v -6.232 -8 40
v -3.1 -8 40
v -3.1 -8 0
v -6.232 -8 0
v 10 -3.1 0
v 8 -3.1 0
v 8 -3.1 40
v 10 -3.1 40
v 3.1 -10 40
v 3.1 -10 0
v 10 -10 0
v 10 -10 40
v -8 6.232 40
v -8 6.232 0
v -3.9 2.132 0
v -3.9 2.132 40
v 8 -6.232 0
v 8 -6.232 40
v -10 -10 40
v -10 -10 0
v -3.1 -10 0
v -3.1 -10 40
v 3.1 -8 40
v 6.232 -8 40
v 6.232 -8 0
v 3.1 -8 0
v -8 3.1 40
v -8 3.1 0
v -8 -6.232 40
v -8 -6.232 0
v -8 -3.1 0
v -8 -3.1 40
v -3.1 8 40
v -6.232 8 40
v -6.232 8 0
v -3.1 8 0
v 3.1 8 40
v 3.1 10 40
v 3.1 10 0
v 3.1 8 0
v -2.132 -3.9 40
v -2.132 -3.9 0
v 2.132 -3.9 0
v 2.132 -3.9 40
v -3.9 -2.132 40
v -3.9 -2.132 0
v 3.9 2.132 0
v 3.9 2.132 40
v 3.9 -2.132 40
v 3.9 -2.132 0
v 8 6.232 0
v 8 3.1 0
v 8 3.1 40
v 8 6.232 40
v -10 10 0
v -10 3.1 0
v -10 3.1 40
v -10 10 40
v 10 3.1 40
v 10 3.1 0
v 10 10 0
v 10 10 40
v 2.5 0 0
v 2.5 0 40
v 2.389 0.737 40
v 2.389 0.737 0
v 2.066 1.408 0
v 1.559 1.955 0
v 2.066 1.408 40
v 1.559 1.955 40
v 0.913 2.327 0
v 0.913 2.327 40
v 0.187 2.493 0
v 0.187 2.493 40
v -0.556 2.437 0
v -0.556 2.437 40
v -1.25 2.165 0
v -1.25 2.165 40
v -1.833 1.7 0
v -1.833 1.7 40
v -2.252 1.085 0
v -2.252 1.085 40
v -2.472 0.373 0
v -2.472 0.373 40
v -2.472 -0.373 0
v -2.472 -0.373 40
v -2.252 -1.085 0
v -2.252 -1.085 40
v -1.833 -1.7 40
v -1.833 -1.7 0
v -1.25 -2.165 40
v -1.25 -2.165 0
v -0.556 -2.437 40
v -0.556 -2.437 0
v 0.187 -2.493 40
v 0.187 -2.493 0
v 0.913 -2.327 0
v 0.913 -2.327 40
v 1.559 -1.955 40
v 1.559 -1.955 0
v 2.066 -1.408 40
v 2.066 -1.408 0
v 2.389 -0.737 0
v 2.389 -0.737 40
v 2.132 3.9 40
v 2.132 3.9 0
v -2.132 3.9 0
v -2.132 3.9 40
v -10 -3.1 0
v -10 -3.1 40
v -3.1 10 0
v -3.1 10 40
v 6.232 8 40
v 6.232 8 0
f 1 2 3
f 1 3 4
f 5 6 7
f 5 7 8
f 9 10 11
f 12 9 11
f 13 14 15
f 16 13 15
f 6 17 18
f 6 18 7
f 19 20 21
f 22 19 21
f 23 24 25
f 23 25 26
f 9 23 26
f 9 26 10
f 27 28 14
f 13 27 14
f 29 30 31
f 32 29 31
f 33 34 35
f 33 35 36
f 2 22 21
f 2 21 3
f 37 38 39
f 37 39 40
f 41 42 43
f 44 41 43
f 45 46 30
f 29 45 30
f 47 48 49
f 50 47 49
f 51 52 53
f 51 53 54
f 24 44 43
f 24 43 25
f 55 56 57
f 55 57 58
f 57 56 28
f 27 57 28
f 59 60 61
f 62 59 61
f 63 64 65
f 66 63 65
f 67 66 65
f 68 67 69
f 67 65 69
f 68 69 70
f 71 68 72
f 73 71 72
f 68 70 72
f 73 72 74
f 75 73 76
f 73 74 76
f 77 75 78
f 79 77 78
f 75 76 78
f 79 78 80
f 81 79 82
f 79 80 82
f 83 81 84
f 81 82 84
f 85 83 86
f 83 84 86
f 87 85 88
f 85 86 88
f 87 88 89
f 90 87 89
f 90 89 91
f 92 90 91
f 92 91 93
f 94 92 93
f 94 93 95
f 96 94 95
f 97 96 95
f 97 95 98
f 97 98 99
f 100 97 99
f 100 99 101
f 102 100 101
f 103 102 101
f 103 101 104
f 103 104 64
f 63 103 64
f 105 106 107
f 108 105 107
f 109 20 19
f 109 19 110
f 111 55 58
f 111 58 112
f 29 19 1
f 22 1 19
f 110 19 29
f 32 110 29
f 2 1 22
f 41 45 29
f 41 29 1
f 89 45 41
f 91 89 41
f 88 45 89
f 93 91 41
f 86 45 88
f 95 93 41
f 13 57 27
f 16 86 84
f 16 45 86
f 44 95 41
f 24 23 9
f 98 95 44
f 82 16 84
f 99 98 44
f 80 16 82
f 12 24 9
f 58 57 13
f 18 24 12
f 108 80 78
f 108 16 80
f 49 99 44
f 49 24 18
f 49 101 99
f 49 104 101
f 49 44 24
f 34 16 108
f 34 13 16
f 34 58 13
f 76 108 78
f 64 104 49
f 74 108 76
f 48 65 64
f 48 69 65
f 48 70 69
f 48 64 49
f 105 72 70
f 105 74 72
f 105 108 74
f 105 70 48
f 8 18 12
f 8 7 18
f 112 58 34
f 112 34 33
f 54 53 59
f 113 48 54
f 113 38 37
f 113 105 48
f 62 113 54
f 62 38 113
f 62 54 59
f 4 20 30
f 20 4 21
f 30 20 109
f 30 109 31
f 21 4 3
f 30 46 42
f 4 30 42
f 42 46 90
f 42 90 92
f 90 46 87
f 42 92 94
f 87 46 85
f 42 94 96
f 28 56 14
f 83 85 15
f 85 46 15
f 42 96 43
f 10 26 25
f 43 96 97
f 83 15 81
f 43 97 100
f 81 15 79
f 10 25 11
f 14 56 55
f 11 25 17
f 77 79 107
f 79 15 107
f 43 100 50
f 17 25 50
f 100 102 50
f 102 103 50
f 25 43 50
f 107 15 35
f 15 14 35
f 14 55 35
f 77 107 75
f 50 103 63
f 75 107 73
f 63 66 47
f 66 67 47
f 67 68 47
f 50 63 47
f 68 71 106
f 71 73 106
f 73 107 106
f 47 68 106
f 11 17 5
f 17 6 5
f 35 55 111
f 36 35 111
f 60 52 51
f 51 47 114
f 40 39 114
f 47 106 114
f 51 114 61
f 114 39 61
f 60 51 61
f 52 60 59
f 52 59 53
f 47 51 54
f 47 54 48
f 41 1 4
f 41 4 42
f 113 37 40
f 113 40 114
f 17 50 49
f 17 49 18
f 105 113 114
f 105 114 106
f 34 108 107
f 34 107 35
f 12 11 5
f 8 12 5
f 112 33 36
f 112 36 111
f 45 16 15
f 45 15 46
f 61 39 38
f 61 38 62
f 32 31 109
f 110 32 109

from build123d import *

# Parameters (mm, degrees)
SKETCH_W        = 20
SKETCH_H        = 20
PAD_DEPTH       = 40
SKETCH001_R     = 2.5
POCKET_DEPTH    = 40.001
POCKET001_DEPTH = 40.001


with BuildPart() as part:
    # Sketch → Pad (new body)
    with BuildSketch(Plane.XY):
        Rectangle(SKETCH_W, SKETCH_H)
    extrude(amount=PAD_DEPTH)

    # Sketch001 (on Face6 of Pad) → Pocket (cut, through all)
    with BuildSketch(Plane.XY.offset(40)):
        Circle(SKETCH001_R)
        Polygon((-3.1, 10), (3.1, 10), (3.1, 8), (6.232233, 8), (2.132233, 3.9), (-2.132233, 3.9), (-6.232233, 8), (-3.1, 8), align=None)
        Polygon((-3.1, -8), (-6.232233, -8), (-2.132233, -3.9), (2.132233, -3.9), (6.232233, -8), (3.1, -8), (3.1, -10), (-3.1, -10), align=None)
    extrude(amount=-POCKET_DEPTH, mode=Mode.SUBTRACT)

    # Sketch002 (on Face2 of Pocket) → Pocket001 (cut, through all)
    with BuildSketch(Plane(origin=(0, 0, 0), x_dir=(1, 0, 0), z_dir=(0, 0, -1))):
        Polygon((-10, -3.1), (-8, -3.1), (-8, -6.232233), (-3.9, -2.132233), (-3.9, 2.132233), (-8, 6.232233), (-8, 3.1), (-10, 3.1), align=None)
        Polygon((3.9, -2.132233), (3.9, 2.132233), (8, 6.232233), (8, 3.1), (10, 3.1), (10, -3.1), (8, -3.1), (8, -6.232233), align=None)
    extrude(amount=-POCKET001_DEPTH, mode=Mode.SUBTRACT)


solid = part.part
